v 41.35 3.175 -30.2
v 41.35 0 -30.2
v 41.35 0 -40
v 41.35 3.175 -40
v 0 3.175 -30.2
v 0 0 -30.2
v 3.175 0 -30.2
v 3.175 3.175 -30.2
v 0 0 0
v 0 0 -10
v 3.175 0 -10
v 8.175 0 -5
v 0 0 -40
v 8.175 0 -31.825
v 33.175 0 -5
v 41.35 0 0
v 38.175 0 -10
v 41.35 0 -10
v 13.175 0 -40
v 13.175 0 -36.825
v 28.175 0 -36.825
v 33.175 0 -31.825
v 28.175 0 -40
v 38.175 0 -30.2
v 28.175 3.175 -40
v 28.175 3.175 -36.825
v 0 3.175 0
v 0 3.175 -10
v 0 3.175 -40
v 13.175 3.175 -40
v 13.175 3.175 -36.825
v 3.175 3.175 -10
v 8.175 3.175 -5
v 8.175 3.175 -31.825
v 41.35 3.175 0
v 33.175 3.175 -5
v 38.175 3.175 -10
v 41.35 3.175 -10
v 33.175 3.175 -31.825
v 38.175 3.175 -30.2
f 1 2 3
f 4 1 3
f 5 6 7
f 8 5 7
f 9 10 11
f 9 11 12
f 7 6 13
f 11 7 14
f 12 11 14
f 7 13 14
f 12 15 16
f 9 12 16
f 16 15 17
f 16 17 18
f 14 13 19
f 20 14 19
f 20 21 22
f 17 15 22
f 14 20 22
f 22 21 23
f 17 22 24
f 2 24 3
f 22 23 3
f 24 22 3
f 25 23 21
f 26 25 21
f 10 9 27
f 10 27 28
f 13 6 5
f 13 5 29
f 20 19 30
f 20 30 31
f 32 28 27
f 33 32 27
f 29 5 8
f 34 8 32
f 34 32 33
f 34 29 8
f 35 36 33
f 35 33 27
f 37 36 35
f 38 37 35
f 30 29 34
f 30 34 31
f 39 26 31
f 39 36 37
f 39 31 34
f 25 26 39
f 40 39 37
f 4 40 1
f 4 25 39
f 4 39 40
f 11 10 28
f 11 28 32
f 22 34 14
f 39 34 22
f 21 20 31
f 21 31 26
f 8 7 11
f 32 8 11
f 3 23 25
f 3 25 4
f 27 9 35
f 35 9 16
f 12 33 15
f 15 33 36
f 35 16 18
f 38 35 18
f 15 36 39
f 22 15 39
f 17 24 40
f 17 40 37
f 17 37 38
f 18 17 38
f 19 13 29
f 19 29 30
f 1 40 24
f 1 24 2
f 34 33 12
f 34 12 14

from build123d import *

# Parameters (mm, degrees)
SKETCH1_W           = 41.35
SKETCH1_H           = 40
BOSS_EXTRUDE1_DEPTH = 3.175
SKETCH2_W           = 3.175
SKETCH2_H           = 20.2
SKETCH2_W_2         = 15
SKETCH2_H_2         = 3.175
CUT_EXTRUDE1_DEPTH  = 4.175
SKETCH3_W           = 25
SKETCH3_H           = 26.825
CUT_EXTRUDE2_DEPTH  = 4.175


with BuildPart() as part:
    # Sketch1 → Boss-Extrude1 (new body)
    with BuildSketch(Plane(origin=(0, 0, 0), x_dir=(1, 0, 0), z_dir=(0, 1, 0))):
        with Locations((20.675, 20)):
            Rectangle(SKETCH1_W, SKETCH1_H)
    extrude(amount=BOSS_EXTRUDE1_DEPTH)

    # Sketch2 → Cut-Extrude1 (cut, through all)
    with BuildSketch(Plane.XZ):
        with Locations((39.7625, -20.1)):
            Rectangle(SKETCH2_W, SKETCH2_H)
        with Locations((1.5875, -20.1)):
            Rectangle(SKETCH2_W, SKETCH2_H)
        with Locations((20.675, -38.4125)):
            Rectangle(SKETCH2_W_2, SKETCH2_H_2)
    extrude(amount=-CUT_EXTRUDE1_DEPTH, mode=Mode.SUBTRACT)

    # Sketch3 → Cut-Extrude2 (cut, through all)
    with BuildSketch(Plane(origin=(0, 3.175, 0), x_dir=(1, 0, 0), z_dir=(0, 1, 0))):
        with Locations((20.675, 18.4125)):
            Rectangle(SKETCH3_W, SKETCH3_H)
    extrude(amount=-CUT_EXTRUDE2_DEPTH, mode=Mode.SUBTRACT)


solid = part.part
